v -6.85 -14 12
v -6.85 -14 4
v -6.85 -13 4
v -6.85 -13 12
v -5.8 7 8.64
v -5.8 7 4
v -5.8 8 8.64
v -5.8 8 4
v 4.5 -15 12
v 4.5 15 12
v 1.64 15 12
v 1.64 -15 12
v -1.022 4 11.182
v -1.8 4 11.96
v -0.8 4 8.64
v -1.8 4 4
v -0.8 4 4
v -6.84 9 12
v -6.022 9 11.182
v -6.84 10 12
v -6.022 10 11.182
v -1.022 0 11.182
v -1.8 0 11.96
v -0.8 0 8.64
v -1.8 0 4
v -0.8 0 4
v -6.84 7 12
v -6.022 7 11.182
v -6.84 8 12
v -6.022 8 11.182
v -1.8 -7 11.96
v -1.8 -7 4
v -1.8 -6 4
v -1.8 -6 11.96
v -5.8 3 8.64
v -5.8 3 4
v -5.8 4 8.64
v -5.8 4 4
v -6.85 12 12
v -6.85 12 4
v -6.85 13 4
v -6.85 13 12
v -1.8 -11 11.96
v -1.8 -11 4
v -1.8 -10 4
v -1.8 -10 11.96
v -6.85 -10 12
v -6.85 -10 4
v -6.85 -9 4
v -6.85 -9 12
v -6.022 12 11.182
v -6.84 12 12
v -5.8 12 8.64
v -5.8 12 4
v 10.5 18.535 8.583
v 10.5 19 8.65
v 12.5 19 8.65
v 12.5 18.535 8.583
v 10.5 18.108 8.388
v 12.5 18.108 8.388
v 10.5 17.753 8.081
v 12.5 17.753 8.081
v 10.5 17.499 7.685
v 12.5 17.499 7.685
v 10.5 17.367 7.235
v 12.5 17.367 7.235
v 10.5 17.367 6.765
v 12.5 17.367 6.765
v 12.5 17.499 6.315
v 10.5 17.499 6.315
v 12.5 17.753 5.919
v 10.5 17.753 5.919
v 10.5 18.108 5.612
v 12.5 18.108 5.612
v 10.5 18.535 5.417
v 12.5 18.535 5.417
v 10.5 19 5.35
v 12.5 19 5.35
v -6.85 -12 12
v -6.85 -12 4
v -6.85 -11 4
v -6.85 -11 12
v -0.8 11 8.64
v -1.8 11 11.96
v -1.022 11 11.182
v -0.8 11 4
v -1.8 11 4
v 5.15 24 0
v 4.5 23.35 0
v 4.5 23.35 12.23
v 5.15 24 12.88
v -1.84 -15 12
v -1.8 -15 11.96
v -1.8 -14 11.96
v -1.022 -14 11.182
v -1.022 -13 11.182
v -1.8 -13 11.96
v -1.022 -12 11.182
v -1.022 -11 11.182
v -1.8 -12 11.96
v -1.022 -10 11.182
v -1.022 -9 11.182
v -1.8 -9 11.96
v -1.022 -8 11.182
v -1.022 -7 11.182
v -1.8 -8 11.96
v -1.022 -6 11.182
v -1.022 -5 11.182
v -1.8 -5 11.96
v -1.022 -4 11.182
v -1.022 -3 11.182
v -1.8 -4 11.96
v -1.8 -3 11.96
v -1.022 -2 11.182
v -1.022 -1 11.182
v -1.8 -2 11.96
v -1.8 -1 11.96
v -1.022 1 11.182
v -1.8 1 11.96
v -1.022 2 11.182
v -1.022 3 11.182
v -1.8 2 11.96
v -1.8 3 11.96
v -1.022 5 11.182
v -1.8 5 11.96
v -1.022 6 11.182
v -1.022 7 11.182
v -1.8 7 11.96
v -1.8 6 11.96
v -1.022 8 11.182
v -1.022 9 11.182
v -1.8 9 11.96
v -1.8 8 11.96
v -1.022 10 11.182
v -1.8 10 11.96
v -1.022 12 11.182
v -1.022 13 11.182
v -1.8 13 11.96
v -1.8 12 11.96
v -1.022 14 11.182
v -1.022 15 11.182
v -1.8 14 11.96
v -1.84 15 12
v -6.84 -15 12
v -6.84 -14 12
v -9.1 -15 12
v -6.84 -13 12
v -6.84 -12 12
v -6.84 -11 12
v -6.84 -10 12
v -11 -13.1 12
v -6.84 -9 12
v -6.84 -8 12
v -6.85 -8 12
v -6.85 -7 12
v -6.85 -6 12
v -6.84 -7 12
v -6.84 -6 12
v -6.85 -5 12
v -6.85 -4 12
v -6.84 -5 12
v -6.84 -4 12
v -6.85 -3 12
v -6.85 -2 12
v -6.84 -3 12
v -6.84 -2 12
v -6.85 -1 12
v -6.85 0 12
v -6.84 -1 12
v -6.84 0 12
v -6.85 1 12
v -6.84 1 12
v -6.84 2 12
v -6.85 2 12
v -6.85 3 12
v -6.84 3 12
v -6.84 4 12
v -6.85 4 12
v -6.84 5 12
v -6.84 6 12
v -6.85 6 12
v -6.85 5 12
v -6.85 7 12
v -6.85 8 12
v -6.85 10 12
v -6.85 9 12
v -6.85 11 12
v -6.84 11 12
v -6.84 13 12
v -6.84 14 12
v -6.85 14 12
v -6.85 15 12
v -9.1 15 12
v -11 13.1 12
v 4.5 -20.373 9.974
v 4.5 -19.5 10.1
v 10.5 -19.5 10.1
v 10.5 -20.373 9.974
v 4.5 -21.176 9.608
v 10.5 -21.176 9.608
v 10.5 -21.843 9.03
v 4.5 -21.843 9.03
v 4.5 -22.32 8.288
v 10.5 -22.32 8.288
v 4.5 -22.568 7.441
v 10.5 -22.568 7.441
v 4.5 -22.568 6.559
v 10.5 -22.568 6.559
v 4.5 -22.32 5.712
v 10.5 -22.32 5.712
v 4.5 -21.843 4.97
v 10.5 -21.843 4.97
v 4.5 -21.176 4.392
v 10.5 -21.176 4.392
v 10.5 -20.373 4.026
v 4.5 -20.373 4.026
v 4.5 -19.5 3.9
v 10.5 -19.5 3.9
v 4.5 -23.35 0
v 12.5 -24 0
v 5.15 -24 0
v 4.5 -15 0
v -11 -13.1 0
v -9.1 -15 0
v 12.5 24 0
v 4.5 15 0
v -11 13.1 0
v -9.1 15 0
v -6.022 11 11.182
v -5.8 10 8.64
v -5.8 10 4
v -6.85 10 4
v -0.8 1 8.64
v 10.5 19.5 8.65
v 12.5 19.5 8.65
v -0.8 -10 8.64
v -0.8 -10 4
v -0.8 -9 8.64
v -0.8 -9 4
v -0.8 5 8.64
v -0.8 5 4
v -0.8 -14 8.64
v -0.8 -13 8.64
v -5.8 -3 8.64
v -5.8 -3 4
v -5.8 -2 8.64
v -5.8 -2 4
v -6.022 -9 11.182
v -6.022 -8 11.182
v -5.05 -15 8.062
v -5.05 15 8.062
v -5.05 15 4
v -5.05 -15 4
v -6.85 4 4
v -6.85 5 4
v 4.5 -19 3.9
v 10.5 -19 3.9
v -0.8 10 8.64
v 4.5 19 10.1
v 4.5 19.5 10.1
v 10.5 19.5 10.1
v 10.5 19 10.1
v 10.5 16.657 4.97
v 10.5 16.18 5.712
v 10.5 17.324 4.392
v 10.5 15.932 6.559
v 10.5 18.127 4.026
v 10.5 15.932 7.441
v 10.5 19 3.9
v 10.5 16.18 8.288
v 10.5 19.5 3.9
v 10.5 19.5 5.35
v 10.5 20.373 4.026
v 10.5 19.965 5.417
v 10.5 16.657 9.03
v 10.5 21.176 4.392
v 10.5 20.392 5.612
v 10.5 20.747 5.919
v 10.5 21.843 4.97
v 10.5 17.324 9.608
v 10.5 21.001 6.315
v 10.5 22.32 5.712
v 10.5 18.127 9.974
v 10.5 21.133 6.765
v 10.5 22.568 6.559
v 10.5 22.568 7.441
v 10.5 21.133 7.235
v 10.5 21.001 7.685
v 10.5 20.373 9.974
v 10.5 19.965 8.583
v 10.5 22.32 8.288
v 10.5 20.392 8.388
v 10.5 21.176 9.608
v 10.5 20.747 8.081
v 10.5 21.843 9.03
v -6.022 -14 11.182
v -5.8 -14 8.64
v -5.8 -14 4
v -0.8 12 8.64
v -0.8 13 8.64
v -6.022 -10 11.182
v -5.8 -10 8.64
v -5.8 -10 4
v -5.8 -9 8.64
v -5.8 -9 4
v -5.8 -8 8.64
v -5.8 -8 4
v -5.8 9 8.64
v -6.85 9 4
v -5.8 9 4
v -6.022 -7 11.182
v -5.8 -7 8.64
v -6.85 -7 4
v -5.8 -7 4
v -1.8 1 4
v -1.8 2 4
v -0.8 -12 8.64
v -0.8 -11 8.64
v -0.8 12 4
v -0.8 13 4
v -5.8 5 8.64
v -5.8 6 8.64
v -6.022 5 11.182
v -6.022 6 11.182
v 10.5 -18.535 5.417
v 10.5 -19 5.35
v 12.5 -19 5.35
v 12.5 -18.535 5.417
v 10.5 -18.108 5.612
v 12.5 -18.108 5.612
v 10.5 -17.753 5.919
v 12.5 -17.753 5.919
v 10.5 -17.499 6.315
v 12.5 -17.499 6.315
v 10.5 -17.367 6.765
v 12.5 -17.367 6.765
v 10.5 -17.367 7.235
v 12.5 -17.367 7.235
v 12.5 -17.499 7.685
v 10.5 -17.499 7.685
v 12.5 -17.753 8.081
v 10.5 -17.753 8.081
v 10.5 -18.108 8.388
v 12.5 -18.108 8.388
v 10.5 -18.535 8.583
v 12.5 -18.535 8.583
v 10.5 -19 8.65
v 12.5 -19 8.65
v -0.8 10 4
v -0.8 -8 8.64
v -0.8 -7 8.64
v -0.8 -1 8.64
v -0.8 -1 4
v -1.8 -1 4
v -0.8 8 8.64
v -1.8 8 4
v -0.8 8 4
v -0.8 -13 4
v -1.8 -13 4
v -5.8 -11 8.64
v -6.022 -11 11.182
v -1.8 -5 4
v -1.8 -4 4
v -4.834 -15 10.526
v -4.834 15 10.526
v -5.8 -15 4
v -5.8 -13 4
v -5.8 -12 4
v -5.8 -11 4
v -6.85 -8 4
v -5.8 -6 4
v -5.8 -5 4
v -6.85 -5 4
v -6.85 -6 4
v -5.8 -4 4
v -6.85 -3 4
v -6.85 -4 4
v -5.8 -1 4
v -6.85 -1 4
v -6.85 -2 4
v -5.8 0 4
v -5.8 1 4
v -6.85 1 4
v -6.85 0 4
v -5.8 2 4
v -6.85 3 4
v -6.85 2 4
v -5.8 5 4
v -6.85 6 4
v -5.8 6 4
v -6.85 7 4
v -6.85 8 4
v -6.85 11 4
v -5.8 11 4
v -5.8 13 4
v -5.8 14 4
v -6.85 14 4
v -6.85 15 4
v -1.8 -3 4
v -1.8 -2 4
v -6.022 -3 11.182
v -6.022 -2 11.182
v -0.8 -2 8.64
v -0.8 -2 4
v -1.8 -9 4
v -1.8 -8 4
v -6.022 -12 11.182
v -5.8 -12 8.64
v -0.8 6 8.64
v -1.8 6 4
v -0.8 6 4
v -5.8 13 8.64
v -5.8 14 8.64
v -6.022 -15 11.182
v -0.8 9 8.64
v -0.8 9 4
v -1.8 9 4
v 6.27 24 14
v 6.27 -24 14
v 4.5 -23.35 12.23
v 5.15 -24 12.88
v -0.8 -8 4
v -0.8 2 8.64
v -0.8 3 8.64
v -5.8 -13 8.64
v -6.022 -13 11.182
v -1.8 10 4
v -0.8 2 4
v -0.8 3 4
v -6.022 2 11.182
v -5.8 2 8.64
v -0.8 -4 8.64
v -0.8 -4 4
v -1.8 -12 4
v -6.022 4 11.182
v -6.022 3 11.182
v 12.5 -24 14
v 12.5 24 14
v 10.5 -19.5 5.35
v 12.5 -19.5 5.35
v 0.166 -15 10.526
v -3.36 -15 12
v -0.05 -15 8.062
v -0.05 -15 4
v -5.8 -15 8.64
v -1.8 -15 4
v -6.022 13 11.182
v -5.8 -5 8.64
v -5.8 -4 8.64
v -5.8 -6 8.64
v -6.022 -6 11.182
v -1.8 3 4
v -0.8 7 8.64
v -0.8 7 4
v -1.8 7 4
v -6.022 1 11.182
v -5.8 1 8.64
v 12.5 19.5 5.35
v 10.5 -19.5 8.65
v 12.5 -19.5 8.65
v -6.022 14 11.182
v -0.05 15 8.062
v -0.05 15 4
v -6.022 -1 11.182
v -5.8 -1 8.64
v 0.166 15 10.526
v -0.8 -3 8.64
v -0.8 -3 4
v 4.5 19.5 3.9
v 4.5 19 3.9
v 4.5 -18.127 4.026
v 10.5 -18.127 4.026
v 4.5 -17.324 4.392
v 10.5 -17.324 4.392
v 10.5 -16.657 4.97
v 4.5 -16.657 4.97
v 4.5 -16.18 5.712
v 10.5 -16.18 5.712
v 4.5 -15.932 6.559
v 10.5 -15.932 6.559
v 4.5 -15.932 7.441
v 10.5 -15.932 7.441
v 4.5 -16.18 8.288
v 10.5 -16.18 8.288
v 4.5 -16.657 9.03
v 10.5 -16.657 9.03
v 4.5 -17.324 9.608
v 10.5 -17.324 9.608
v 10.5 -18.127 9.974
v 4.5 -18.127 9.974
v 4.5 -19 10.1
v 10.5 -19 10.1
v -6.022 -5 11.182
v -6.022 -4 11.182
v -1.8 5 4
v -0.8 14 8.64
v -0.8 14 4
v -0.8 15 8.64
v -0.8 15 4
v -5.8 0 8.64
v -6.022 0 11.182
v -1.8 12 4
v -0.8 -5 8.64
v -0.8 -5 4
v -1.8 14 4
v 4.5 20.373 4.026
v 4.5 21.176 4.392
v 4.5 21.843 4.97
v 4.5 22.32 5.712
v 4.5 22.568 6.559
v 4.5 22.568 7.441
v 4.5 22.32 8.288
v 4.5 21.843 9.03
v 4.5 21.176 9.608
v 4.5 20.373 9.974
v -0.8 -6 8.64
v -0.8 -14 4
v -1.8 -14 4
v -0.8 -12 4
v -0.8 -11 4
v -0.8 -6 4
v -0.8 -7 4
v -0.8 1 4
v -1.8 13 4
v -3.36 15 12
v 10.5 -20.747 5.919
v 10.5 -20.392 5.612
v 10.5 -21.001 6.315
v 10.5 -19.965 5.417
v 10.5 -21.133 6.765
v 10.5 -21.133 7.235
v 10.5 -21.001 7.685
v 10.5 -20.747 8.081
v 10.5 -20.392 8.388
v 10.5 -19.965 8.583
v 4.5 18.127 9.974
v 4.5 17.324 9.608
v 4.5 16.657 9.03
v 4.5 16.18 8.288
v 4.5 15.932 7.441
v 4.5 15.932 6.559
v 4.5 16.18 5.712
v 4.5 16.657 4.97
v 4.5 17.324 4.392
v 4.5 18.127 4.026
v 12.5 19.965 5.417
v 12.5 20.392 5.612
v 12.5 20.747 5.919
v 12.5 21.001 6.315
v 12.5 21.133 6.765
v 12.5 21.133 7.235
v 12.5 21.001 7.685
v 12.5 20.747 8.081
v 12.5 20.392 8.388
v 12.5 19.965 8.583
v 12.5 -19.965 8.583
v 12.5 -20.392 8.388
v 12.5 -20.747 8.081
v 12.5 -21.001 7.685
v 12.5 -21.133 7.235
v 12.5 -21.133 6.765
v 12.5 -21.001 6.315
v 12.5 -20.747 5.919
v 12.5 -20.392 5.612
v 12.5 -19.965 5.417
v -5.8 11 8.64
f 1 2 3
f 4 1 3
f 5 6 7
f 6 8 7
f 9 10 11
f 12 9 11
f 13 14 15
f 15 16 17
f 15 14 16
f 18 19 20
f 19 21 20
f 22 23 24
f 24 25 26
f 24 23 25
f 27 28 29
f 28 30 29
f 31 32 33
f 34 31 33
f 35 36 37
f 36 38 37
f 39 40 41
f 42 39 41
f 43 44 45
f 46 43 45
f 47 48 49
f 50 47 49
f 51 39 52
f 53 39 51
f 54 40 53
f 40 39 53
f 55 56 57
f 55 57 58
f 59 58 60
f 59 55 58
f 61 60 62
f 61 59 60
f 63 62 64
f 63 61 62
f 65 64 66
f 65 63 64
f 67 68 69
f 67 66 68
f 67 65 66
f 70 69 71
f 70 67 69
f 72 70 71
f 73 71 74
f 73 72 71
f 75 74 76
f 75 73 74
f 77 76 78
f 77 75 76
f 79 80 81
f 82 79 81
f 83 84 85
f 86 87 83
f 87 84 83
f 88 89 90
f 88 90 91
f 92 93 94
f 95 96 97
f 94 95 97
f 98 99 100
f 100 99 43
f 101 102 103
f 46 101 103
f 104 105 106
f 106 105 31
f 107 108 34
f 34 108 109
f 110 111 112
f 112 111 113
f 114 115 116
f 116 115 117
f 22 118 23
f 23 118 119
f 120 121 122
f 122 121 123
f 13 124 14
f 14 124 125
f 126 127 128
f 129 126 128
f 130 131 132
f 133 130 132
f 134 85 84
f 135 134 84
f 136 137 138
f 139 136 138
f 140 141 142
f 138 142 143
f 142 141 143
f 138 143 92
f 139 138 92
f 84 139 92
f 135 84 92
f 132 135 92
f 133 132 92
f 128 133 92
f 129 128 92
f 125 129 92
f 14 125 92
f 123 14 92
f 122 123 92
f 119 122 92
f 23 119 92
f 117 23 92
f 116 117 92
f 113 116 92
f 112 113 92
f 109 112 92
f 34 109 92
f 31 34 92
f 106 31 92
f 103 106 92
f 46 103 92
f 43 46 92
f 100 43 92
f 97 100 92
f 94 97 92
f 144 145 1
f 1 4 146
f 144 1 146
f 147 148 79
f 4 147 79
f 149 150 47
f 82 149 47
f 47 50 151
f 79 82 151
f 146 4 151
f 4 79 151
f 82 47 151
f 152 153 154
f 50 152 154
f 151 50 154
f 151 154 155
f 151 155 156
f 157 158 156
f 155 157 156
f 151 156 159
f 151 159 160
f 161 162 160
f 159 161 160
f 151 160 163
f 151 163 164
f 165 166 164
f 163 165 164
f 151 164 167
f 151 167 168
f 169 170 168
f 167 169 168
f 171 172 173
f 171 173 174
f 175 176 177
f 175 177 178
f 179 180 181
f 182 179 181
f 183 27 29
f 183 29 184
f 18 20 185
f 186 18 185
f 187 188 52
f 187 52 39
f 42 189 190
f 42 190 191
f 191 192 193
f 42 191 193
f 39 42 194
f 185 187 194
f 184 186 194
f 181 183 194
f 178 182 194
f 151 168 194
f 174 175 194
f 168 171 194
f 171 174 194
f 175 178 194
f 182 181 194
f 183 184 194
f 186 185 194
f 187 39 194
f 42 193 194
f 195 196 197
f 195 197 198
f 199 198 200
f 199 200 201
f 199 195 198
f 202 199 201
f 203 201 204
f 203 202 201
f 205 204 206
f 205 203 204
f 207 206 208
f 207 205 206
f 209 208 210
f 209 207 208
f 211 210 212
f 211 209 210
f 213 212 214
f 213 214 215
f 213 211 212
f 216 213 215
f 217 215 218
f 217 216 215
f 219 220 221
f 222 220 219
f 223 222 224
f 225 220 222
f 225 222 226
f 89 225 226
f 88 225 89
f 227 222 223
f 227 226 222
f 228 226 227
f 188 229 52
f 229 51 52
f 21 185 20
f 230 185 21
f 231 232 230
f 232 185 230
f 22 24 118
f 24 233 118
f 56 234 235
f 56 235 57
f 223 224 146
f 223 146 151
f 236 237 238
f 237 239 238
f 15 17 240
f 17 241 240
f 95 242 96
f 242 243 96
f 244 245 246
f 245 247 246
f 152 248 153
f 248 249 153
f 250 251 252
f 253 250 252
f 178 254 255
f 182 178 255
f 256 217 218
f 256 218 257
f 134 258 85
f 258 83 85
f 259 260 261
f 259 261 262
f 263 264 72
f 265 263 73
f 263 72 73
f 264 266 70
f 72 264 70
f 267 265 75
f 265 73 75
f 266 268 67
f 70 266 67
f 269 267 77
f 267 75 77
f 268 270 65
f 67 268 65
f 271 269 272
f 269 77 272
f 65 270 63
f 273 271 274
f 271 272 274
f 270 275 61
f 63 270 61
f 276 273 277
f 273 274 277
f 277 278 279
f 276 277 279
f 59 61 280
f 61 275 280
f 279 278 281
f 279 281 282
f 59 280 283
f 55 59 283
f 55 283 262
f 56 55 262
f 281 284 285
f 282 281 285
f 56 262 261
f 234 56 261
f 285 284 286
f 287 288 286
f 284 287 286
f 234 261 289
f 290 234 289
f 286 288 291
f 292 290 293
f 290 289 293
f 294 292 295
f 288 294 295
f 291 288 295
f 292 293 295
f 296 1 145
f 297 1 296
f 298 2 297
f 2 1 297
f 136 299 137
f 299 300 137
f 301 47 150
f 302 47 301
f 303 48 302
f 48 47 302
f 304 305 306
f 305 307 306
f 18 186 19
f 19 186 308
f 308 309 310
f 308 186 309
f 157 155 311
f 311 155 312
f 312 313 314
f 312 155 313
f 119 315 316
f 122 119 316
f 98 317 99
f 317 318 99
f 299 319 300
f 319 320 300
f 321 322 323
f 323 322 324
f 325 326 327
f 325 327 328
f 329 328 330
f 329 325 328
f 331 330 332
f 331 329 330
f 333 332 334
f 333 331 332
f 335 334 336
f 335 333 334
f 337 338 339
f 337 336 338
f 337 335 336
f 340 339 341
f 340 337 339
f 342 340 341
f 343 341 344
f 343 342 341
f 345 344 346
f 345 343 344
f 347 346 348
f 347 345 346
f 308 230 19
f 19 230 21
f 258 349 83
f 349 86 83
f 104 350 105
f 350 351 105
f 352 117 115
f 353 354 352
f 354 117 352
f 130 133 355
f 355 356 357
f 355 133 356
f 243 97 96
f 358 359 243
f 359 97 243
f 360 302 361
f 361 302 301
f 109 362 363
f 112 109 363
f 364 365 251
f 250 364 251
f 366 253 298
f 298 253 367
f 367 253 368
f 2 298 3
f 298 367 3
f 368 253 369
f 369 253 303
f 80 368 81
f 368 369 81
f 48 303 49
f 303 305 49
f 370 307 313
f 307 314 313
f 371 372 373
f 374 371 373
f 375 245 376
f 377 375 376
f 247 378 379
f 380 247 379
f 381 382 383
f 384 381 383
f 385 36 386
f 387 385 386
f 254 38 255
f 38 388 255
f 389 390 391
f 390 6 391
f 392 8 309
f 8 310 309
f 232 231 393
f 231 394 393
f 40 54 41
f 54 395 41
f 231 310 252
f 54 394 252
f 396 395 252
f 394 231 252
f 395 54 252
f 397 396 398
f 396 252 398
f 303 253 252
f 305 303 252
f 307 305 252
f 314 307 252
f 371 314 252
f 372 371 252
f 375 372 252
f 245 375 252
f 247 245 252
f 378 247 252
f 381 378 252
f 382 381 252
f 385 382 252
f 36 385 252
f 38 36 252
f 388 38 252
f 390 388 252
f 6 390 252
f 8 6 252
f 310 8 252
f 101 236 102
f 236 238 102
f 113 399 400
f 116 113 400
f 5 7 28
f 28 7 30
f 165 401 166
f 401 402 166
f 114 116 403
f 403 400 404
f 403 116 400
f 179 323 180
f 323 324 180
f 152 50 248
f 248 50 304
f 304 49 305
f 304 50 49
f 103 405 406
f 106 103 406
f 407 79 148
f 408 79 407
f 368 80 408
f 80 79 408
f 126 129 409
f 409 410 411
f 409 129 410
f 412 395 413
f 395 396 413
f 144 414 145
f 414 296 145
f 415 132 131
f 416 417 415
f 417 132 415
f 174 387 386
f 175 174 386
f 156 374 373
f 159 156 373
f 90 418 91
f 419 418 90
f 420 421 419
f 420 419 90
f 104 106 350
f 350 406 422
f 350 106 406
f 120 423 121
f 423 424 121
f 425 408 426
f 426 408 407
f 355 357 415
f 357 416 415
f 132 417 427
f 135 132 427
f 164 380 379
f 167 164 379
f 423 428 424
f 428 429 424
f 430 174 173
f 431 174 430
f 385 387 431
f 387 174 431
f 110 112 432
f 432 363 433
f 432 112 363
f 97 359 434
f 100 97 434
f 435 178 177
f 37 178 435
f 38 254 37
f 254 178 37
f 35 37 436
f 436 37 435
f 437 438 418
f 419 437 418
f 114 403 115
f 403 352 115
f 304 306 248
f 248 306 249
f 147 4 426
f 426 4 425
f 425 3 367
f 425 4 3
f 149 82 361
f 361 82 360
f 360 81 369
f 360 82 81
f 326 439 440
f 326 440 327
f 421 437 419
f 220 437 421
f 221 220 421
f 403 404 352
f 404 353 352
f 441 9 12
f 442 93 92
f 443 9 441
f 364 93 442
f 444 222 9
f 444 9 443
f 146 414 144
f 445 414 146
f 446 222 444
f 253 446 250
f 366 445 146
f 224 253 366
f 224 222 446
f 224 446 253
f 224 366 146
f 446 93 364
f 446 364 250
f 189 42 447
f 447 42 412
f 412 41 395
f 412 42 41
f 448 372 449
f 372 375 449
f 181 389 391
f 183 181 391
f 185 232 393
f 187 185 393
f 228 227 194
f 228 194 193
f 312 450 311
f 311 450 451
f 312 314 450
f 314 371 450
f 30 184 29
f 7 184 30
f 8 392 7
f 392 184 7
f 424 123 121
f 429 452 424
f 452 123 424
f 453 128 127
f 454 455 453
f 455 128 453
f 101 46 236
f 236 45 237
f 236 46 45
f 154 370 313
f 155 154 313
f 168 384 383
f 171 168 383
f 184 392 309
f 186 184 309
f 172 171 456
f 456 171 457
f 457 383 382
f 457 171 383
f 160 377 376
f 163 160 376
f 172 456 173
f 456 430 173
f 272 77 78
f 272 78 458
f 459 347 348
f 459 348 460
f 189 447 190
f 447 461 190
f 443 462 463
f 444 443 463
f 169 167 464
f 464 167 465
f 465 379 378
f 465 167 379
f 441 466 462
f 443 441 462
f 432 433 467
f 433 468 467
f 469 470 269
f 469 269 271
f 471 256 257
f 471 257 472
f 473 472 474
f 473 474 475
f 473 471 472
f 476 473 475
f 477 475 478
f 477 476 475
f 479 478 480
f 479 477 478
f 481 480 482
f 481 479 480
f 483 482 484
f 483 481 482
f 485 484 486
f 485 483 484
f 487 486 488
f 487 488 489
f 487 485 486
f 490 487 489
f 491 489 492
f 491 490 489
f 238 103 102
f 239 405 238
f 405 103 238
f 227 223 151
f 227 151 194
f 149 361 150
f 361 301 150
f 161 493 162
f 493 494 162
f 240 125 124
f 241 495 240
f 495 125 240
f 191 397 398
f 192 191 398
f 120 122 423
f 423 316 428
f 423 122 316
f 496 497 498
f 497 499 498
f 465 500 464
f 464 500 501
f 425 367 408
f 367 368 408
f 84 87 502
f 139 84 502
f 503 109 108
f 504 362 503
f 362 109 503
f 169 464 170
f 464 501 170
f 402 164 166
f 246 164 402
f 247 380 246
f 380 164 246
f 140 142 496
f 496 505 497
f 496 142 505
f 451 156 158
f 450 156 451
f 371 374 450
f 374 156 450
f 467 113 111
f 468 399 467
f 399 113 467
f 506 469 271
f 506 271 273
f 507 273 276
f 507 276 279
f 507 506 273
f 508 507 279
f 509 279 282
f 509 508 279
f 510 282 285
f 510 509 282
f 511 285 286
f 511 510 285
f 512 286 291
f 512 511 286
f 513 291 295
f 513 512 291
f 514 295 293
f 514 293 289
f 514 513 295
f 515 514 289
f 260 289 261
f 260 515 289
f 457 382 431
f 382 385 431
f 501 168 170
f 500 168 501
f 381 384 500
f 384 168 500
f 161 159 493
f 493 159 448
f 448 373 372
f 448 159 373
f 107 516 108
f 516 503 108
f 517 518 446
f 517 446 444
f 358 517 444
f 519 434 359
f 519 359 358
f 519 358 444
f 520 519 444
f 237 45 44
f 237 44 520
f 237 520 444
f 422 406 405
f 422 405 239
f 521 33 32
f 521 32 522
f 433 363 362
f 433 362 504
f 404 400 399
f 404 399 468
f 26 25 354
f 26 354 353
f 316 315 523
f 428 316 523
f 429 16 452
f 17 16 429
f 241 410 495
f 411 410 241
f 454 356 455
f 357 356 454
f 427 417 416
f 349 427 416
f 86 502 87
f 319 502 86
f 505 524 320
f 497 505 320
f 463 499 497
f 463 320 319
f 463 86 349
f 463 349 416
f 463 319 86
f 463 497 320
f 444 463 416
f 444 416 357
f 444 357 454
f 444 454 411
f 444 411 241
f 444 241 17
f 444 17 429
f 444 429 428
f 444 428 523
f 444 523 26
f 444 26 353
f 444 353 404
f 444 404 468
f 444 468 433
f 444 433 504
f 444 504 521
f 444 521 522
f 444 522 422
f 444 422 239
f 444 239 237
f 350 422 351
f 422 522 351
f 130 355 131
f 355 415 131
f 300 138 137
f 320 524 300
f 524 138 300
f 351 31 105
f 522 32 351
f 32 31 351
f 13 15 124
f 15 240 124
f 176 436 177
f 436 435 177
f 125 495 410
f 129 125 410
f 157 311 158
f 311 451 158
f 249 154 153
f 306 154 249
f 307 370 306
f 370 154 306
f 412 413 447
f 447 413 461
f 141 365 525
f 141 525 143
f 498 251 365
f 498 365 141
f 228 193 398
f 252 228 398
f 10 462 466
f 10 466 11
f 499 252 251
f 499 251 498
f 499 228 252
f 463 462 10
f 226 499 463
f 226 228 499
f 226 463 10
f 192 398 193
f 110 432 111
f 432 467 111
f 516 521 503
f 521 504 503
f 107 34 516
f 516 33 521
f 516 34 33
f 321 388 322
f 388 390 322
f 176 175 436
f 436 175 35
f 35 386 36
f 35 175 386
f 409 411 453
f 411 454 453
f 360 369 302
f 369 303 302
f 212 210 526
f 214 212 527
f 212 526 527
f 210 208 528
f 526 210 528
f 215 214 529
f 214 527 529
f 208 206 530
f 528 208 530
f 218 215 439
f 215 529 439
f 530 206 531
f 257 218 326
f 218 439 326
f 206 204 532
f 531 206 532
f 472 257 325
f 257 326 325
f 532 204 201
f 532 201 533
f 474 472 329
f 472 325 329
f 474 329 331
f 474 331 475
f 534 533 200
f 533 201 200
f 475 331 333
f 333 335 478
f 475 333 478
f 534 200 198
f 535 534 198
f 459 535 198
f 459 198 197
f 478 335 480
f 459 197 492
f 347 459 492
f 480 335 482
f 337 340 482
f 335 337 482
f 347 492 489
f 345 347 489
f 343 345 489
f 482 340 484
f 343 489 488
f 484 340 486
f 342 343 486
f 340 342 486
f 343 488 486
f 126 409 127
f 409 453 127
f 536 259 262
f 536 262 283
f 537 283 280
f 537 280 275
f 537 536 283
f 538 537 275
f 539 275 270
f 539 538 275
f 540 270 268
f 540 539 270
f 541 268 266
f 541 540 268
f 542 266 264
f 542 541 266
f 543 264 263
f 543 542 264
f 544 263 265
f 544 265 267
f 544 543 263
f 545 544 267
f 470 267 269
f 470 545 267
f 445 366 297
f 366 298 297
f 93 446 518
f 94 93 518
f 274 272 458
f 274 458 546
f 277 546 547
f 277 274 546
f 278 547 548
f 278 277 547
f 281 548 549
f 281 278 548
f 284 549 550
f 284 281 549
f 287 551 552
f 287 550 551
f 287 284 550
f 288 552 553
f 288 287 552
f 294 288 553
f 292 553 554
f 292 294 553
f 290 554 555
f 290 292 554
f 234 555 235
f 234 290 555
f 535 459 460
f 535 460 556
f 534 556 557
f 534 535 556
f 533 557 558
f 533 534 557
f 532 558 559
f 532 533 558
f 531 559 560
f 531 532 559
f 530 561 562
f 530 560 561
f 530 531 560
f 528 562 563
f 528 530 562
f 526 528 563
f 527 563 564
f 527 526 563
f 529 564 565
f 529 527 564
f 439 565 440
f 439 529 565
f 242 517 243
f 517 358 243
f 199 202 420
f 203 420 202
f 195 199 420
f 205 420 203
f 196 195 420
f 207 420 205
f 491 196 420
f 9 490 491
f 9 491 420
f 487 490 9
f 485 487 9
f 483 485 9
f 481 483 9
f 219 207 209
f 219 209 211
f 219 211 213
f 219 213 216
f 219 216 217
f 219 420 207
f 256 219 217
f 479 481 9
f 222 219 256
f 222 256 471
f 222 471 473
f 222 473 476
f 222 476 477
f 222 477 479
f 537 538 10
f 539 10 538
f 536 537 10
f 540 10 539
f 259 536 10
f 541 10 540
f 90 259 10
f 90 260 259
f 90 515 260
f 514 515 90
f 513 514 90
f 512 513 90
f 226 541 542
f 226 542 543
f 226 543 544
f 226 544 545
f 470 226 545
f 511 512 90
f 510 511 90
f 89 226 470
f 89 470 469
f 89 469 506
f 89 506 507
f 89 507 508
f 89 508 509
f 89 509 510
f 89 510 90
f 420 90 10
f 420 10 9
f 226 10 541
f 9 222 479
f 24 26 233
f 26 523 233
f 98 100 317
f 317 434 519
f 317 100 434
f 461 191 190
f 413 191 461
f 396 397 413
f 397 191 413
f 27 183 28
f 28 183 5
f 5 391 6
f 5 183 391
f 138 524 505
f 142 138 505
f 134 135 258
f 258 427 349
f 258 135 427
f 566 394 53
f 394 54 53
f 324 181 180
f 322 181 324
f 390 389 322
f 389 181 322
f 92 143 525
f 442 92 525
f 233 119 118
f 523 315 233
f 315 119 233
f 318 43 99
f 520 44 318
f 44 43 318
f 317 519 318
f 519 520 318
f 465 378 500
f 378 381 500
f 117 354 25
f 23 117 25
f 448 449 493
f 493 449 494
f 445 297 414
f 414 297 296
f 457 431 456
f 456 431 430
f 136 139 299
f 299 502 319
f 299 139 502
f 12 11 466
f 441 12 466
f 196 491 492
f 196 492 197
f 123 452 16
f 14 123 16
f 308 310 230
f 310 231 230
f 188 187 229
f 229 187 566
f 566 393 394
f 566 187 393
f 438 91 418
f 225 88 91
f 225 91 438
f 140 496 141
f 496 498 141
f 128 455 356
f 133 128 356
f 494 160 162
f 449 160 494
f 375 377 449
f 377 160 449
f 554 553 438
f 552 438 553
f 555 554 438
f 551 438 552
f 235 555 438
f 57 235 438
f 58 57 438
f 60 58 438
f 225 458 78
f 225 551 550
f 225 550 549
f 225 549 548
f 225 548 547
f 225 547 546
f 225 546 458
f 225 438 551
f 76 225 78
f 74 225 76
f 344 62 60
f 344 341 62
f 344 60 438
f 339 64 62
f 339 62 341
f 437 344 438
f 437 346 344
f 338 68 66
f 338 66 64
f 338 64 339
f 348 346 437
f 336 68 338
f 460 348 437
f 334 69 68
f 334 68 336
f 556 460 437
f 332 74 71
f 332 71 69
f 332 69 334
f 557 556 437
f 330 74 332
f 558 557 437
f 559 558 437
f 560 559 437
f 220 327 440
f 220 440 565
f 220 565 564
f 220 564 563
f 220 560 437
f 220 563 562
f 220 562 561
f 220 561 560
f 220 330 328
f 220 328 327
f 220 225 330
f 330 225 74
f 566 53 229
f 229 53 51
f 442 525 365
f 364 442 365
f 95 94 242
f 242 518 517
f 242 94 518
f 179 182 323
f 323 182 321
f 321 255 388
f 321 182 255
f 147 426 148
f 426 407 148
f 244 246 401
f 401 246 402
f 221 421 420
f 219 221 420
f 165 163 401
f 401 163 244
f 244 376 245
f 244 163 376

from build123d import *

# Parameters (mm, degrees)
PAD_DEPTH           = 14
POCKET_DEPTH        = 24.001
POCKET_DEPTH_BACK   = -24.001
SKETCH002_W         = 1.5
SKETCH002_H         = 1
POCKET001_DEPTH     = 10.001
LINEARPATTERN_COUNT = 15
LINEARPATTERN_PITCH = 2
POCKET002_DEPTH     = 8.001
POCKET003_DEPTH     = 6


with BuildPart() as part:
    # Sketch → Pad (new body)
    with BuildSketch(Plane.XY):
        Polygon((12.5, 24), (12.5, -24), (5.15, -24), (4.5, -23.35), (4.5, -15), (-9.1, -15), (-11, -13.1), (-11, 13.1), (-9.1, 15), (4.5, 15), (4.5, 23.35), (5.15, 24), align=None)
    extrude(amount=PAD_DEPTH)

    # Sketch001 → Pocket (cut, two sides)
    with BuildSketch(Plane.XZ) as pocket_sk:
        Polygon((6.5, 15), (6.5, 14.23), (4.5, 12.23), (4.5, 12), (1.64, 12), (0.165531, 10.525531), (-0.05, 8.062), (-0.05, 4), (-0.8, 4), (-0.8, 8.64), (-1.022434, 11.182434), (-1.84, 12), (-3.36, 12), (-4.834469, 10.525531), (-5.05, 8.062), (-5.05, 4), (-5.8, 4), (-5.8, 8.64), (-6.022434, 11.182434), (-6.84, 12), (-12, 12), (-12, 15), align=None)
    extrude(amount=-POCKET_DEPTH, mode=Mode.SUBTRACT)
    extrude(pocket_sk.sketch, amount=-POCKET_DEPTH_BACK, mode=Mode.SUBTRACT)

    # Sketch002 → Pocket001 (cut, through all)
    with BuildSketch(Plane.XY.offset(4)):
        with Locations((-6.1, 14.5)):
            Rectangle(SKETCH002_W, SKETCH002_H)
        with Locations((-1.05, 13.5)):
            Rectangle(SKETCH002_W, SKETCH002_H)
    pocket001 = extrude(amount=POCKET001_DEPTH, mode=Mode.SUBTRACT)

    # LinearPattern: Pocket001 ×15
    with Locations(*[(0, -i * LINEARPATTERN_PITCH, 0) for i in range(1, LINEARPATTERN_COUNT)]):
        add(pocket001, mode=Mode.SUBTRACT)

    # Sketch003 → Pocket002 (cut, through all)
    with BuildSketch(Plane.YZ.offset(4.5)):
        with BuildLine():
            ThreePointArc((-19.5, 8.65), (-21.15, 7), (-19.5, 5.35))
            Line((-19.5, 5.35), (-19, 5.35))
            ThreePointArc((-19, 5.35), (-17.35, 7), (-19, 8.65))
            Line((-19, 8.65), (-19.5, 8.65))
        make_face()
        with BuildLine():
            ThreePointArc((19, 8.65), (17.35, 7), (19, 5.35))
            Line((19, 5.35), (19.5, 5.35))
            ThreePointArc((19.5, 5.35), (21.15, 7), (19.5, 8.65))
            Line((19.5, 8.65), (19, 8.65))
        make_face()
    extrude(amount=POCKET002_DEPTH, mode=Mode.SUBTRACT)

    # Sketch004 → Pocket003 (cut)
    with BuildSketch(Plane.YZ.offset(4.5)):
        with BuildLine():
            ThreePointArc((-19.5, 10.1), (-22.6, 7), (-19.5, 3.9))
            Line((-19.5, 3.9), (-19, 3.9))
            ThreePointArc((-19, 3.9), (-15.9, 7), (-19, 10.1))
            Line((-19, 10.1), (-19.5, 10.1))
        make_face()
        with BuildLine():
            ThreePointArc((19, 10.1), (15.9, 7), (19, 3.9))
            Line((19, 3.9), (19.5, 3.9))
            ThreePointArc((19.5, 3.9), (22.6, 7), (19.5, 10.1))
            Line((19.5, 10.1), (19, 10.1))
        make_face()
    extrude(amount=POCKET003_DEPTH, mode=Mode.SUBTRACT)


solid = part.part
